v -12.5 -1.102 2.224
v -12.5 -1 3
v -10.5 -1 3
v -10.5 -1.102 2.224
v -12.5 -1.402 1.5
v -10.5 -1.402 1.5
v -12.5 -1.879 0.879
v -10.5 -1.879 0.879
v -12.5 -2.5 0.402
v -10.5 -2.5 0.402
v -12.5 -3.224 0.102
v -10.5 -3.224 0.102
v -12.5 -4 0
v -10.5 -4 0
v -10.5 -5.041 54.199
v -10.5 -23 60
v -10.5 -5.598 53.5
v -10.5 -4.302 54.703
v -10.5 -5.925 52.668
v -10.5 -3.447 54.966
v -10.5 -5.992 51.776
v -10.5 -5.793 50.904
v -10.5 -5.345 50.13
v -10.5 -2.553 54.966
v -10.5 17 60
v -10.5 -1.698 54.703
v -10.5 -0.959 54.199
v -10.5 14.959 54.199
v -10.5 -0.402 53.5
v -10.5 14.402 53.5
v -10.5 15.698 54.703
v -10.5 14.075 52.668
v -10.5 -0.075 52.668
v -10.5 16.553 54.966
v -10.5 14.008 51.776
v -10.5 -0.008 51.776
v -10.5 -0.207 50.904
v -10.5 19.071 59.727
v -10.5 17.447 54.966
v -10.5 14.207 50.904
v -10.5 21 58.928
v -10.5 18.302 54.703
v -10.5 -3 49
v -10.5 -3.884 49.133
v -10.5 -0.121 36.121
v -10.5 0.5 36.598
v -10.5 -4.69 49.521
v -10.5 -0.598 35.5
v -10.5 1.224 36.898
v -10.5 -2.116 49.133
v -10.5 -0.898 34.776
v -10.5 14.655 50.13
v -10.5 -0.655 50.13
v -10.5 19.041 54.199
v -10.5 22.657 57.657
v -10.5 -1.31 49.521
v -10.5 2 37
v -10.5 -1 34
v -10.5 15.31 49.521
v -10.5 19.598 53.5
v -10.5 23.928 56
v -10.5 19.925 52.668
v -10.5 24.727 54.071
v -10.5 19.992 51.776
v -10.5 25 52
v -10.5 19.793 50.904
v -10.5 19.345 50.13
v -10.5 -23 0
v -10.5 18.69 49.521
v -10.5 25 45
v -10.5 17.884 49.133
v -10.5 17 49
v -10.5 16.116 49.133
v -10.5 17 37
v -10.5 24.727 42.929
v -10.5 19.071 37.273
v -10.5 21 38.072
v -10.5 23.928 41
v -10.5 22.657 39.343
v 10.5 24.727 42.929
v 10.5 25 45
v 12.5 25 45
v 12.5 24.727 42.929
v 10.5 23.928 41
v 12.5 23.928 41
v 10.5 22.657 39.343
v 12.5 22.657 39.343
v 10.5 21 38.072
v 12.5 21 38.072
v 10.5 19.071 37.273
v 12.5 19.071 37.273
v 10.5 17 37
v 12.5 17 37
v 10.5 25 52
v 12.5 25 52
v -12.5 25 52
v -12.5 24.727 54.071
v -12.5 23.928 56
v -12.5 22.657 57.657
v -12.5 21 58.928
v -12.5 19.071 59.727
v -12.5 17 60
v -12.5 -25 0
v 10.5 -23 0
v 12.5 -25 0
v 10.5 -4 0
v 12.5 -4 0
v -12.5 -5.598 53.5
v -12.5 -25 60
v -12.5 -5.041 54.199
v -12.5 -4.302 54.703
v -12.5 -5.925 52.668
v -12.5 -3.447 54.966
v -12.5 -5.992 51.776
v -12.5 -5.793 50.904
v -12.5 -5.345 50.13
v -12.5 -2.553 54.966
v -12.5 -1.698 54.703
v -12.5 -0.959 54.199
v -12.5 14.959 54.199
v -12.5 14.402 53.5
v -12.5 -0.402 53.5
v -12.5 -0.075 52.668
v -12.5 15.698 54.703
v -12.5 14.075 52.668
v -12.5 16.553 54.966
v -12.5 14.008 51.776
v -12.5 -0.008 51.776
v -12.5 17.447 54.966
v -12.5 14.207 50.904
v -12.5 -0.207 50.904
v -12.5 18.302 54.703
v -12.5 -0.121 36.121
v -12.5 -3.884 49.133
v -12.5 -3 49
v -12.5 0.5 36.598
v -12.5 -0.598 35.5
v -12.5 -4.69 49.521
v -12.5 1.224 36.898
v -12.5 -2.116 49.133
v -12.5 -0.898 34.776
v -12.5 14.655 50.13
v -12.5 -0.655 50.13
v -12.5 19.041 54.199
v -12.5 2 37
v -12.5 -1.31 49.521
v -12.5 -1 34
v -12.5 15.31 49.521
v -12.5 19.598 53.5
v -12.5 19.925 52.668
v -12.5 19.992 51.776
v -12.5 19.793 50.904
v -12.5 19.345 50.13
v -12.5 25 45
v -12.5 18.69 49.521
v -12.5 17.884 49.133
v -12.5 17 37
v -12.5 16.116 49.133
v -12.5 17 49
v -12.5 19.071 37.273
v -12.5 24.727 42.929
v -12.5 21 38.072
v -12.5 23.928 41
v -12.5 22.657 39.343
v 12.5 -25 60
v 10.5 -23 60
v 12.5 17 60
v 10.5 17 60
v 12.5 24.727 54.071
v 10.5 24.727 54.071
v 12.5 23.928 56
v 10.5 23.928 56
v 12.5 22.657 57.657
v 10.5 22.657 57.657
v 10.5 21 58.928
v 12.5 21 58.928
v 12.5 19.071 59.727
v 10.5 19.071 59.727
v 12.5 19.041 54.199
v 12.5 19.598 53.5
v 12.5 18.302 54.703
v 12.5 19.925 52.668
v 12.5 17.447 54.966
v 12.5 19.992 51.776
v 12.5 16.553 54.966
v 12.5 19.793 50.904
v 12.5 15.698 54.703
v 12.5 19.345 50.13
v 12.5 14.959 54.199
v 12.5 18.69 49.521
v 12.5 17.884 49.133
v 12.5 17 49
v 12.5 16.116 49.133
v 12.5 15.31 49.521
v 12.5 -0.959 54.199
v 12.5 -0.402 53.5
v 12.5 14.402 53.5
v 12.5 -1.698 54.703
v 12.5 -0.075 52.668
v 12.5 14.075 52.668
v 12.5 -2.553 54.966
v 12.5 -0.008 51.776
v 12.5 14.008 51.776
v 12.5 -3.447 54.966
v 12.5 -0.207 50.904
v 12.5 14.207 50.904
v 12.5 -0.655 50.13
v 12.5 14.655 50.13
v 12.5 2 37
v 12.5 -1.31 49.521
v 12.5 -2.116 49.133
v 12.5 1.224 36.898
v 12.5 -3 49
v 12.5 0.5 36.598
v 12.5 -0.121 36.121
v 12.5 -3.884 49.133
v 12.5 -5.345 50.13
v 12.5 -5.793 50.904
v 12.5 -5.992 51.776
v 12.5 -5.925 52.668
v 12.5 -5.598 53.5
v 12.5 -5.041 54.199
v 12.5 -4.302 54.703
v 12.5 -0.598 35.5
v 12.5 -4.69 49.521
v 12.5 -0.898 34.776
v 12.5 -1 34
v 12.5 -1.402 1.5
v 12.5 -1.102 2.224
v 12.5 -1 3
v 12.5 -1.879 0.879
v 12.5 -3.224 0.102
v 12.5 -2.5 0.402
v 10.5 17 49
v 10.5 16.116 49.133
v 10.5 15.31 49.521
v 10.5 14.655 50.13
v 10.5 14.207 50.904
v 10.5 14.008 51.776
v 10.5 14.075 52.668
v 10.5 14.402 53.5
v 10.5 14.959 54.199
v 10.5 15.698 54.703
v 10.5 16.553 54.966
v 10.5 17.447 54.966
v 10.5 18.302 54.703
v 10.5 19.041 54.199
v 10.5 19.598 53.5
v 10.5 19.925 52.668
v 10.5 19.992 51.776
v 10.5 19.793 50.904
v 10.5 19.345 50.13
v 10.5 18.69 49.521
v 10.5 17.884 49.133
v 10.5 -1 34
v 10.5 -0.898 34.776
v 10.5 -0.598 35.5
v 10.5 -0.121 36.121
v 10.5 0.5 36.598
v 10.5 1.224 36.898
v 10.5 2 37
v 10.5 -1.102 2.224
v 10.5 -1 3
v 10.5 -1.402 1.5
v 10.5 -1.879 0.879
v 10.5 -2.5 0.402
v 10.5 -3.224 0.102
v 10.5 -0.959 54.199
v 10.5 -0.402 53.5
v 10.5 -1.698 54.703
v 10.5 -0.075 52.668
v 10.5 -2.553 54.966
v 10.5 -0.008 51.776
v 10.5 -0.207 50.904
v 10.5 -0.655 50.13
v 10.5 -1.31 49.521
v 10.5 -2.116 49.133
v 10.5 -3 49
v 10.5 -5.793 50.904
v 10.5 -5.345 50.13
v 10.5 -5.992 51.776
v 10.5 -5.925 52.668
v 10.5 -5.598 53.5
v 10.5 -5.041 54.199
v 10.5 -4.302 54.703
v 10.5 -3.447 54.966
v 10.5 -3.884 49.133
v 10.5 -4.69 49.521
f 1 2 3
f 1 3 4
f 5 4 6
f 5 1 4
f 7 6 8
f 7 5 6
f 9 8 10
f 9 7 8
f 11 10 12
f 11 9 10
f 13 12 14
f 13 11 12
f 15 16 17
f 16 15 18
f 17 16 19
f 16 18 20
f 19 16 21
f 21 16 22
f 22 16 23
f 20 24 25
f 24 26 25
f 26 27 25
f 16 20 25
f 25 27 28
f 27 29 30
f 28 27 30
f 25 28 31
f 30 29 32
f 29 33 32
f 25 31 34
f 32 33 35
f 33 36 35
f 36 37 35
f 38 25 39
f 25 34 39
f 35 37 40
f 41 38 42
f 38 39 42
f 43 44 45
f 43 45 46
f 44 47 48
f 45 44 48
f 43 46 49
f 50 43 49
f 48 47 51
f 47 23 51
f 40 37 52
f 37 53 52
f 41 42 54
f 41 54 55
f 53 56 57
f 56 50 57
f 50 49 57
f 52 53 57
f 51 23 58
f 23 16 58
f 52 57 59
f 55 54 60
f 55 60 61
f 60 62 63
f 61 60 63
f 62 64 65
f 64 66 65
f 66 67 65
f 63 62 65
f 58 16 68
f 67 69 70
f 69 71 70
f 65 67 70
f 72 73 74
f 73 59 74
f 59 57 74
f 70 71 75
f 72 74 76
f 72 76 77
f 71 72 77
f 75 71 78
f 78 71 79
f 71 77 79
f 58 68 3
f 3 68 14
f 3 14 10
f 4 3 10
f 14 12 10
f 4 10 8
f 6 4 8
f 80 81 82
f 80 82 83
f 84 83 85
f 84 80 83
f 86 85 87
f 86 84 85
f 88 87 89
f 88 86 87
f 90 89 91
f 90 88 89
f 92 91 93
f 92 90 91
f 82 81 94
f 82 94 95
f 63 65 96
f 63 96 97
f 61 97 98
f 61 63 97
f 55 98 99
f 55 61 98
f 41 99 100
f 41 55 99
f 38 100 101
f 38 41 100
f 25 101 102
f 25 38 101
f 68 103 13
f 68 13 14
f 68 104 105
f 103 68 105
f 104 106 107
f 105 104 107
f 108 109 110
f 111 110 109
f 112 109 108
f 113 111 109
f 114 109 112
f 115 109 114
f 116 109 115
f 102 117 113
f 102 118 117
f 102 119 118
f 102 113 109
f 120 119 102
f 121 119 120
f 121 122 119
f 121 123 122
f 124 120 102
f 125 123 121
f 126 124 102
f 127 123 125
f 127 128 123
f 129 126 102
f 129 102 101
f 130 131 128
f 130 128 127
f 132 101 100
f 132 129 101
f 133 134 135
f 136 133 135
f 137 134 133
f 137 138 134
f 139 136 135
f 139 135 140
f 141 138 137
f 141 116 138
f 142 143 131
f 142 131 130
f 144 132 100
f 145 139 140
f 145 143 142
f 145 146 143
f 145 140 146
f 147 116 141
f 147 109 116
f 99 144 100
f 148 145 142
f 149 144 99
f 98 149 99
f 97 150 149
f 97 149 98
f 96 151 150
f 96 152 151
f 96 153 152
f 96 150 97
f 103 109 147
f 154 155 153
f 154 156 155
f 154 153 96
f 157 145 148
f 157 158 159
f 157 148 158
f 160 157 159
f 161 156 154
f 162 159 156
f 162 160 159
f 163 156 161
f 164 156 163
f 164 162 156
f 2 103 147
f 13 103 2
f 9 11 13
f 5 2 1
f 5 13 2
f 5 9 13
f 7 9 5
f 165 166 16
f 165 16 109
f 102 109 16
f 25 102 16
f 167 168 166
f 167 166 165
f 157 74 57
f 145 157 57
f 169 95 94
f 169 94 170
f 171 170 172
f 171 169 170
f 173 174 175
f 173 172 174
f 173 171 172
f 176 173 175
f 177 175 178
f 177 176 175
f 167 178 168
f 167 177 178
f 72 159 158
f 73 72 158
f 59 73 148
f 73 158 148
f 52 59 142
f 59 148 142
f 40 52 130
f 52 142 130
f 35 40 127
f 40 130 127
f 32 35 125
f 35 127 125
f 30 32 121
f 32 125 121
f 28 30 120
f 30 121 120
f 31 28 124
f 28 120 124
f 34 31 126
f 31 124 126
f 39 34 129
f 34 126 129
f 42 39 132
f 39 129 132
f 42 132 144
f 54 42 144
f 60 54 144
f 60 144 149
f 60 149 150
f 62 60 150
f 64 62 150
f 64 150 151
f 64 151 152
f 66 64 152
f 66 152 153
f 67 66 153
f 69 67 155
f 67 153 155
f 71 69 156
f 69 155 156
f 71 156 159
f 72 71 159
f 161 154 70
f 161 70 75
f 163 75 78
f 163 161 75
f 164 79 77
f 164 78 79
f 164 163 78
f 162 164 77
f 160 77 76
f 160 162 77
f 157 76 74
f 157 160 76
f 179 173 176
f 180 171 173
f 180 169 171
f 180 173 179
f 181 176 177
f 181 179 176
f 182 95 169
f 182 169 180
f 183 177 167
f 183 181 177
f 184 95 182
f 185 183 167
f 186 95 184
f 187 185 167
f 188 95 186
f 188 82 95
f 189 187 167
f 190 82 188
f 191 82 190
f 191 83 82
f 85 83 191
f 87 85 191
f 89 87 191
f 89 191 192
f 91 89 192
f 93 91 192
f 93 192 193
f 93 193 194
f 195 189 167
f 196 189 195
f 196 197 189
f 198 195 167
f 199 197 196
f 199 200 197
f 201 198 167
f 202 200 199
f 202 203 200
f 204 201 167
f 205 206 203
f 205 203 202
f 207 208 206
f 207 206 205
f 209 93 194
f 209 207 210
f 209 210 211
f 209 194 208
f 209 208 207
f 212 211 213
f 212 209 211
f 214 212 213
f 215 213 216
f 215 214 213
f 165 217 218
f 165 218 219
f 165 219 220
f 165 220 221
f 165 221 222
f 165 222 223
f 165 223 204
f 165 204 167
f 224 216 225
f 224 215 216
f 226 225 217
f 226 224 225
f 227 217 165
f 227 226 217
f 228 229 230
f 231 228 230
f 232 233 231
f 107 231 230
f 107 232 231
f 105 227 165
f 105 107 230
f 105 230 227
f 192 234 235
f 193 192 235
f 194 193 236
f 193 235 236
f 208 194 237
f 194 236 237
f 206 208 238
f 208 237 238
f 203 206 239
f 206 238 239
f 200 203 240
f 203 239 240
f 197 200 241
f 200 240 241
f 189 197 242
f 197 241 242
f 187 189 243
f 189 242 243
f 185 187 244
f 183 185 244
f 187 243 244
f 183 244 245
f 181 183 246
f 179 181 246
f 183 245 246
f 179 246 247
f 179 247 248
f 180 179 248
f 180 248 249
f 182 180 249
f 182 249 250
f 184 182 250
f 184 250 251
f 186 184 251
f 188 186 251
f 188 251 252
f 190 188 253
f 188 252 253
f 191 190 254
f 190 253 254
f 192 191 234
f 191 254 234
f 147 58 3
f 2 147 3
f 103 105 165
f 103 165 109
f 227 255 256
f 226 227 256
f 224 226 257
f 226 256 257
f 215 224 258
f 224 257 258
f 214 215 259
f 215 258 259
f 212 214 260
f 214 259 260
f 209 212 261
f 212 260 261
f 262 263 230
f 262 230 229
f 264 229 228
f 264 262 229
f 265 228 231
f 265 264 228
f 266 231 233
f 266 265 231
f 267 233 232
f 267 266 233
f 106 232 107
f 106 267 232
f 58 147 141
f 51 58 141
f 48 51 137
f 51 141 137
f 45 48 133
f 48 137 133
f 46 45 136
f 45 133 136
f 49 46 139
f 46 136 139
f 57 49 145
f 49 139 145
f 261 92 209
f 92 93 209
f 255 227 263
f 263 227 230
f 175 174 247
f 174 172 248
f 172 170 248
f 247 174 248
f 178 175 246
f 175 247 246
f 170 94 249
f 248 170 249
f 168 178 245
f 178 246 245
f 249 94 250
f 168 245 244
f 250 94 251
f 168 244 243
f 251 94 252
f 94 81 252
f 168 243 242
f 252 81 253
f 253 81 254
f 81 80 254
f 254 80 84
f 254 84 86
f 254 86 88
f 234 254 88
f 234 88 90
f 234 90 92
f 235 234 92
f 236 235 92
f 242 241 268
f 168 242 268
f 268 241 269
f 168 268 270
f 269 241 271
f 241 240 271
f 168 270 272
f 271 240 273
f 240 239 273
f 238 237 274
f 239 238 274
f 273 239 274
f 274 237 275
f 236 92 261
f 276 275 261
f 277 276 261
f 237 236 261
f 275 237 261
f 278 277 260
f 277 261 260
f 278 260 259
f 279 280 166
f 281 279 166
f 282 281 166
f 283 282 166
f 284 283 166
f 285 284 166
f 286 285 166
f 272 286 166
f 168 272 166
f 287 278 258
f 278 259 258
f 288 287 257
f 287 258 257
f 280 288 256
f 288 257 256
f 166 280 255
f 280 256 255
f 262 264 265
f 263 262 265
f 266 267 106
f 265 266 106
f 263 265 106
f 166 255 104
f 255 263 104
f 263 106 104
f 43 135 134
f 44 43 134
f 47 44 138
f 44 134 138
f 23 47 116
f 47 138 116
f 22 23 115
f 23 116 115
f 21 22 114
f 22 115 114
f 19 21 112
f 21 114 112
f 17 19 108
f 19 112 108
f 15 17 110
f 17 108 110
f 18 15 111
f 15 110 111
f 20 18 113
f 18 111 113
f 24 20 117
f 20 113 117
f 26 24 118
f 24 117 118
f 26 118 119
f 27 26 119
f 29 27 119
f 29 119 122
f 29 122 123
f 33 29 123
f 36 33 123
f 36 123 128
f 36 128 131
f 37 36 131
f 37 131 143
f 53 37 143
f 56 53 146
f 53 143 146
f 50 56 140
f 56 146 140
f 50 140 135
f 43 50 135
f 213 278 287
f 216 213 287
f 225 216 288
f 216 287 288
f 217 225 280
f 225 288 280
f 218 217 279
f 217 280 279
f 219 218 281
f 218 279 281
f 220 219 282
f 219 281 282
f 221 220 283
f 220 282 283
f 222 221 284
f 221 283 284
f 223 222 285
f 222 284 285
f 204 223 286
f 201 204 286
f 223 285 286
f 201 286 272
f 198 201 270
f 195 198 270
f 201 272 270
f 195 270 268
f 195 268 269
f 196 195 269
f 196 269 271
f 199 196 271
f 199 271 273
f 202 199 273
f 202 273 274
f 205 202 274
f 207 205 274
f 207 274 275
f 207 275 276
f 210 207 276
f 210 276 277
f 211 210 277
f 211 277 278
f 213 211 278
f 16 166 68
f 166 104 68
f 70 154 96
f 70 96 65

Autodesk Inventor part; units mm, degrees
ref_plane "YZ Plane" through (0, 0, 0) normal (1, 0, 0) x (0, 1, 0)
ref_plane "XZ Plane" through (0, 0, 0) normal (0, 1, 0) x (-1, 0, 0)
ref_plane "XY Plane" through (0, 0, 0) normal (0, 0, 1) x (1, 0, 0)
sketch "スケッチ1" plane through (0, 0, 0) normal (0, 0, 1) x (1, 0, 0)
  line L0 (-12.5, 25) -> (12.5, 25)
  line L1 (12.5, 25) -> (12.5, -25)
  line L2 (12.5, -25) -> (-12.5, -25)
  line L3 (-12.5, -25) -> (-12.5, 25)
  line L4 (-10.5, 25) -> (10.5, 25)
  line L5 (10.5, 25) -> (10.5, -23)
  line L6 (10.5, -23) -> (-10.5, -23)
  line L7 (-10.5, -23) -> (-10.5, 25)
  point P0 (0, 0)
  dimension "d0" = 25
  dimension "d1" = 50
  dimension "d2" = 25
  dimension "d3" = 12.5
  dimension "d4" = 2
  dimension "d5" = 2
  dimension "d6" = 2
extrude "押し出し1" add sketch "スケッチ1" along normal blind 60 contours L0 L7 L6 L5 L1 L2 L3
sketch "スケッチ2" plane through (12.5, -25, 0) normal (1, 0, 0) x (0, 0, -1)
  line L0 (0, 50) -> (-60, 50) projected
  line L1 (-30, 50) -> (-30, 0)
  line L2 (0, 0) -> (-60, 0) projected
  line L3 (-60, 50) -> (-60, 0) projected
  point P0 (0, 25)
  point P1 (-52, 42)
  point P2 (-52, 22)
  dimension "d12" = 8
  dimension "d76" = 8
  dimension "d85" = 8
  dimension "d86" = 20
hole "Hole1" at (12.5, 17, 52) at (12.5, -3, 52) direction (-1, 0, 0) diameter 6 end through all
sketch "スケッチ9" plane through (12.5, -25, 0) normal (1, 0, 0) x (0, 0, -1)
  circle A0 centre (-52, 22) radius 3 projected
  line L0 (0, 50) -> (-37, 50)
  line L1 (-37, 50) -> (-37, 24)
  line L2 (-37, 24) -> (0, 24)
  line L3 (0, 24) -> (0, 50)
  line L4 (0, 2) -> (-60, 2) projected
  point P0 (0, 25)
  dimension "d77" = 15
  dimension "d78" = 22
extrude "押し出し5" cut sketch "スケッチ9" against normal through all contours L3 L2 L1 L0
fillet "フィレット5" radius 3 2 edges at (11.5, -1, 37) (-11.5, -1, 37)
fillet "フィレット6" radius 8 4 edges at (-11.5, 25, 60) (11.5, 25, 60) (11.5, 25, 37) (-11.5, 25, 37)
fillet "フィレット7" radius 3 2 edges at (11.5, -1, 0) (-11.5, -1, 0)
equation "\"d1\" = 2 * d0"
equation "\"d2\" = 0.5 * d1"
equation "\"d3\" = 0.5 * d0"
equation "\"d4\" = d5"
equation "\"d6\" = d5"
equation "\"d12\" = d11"
equation "\"d76\" = d11"
equation "\"d85\" = d76"
equation "\"d11\" = 8"
properties part number "CounterWeight" material "アルミニウム 6061"
